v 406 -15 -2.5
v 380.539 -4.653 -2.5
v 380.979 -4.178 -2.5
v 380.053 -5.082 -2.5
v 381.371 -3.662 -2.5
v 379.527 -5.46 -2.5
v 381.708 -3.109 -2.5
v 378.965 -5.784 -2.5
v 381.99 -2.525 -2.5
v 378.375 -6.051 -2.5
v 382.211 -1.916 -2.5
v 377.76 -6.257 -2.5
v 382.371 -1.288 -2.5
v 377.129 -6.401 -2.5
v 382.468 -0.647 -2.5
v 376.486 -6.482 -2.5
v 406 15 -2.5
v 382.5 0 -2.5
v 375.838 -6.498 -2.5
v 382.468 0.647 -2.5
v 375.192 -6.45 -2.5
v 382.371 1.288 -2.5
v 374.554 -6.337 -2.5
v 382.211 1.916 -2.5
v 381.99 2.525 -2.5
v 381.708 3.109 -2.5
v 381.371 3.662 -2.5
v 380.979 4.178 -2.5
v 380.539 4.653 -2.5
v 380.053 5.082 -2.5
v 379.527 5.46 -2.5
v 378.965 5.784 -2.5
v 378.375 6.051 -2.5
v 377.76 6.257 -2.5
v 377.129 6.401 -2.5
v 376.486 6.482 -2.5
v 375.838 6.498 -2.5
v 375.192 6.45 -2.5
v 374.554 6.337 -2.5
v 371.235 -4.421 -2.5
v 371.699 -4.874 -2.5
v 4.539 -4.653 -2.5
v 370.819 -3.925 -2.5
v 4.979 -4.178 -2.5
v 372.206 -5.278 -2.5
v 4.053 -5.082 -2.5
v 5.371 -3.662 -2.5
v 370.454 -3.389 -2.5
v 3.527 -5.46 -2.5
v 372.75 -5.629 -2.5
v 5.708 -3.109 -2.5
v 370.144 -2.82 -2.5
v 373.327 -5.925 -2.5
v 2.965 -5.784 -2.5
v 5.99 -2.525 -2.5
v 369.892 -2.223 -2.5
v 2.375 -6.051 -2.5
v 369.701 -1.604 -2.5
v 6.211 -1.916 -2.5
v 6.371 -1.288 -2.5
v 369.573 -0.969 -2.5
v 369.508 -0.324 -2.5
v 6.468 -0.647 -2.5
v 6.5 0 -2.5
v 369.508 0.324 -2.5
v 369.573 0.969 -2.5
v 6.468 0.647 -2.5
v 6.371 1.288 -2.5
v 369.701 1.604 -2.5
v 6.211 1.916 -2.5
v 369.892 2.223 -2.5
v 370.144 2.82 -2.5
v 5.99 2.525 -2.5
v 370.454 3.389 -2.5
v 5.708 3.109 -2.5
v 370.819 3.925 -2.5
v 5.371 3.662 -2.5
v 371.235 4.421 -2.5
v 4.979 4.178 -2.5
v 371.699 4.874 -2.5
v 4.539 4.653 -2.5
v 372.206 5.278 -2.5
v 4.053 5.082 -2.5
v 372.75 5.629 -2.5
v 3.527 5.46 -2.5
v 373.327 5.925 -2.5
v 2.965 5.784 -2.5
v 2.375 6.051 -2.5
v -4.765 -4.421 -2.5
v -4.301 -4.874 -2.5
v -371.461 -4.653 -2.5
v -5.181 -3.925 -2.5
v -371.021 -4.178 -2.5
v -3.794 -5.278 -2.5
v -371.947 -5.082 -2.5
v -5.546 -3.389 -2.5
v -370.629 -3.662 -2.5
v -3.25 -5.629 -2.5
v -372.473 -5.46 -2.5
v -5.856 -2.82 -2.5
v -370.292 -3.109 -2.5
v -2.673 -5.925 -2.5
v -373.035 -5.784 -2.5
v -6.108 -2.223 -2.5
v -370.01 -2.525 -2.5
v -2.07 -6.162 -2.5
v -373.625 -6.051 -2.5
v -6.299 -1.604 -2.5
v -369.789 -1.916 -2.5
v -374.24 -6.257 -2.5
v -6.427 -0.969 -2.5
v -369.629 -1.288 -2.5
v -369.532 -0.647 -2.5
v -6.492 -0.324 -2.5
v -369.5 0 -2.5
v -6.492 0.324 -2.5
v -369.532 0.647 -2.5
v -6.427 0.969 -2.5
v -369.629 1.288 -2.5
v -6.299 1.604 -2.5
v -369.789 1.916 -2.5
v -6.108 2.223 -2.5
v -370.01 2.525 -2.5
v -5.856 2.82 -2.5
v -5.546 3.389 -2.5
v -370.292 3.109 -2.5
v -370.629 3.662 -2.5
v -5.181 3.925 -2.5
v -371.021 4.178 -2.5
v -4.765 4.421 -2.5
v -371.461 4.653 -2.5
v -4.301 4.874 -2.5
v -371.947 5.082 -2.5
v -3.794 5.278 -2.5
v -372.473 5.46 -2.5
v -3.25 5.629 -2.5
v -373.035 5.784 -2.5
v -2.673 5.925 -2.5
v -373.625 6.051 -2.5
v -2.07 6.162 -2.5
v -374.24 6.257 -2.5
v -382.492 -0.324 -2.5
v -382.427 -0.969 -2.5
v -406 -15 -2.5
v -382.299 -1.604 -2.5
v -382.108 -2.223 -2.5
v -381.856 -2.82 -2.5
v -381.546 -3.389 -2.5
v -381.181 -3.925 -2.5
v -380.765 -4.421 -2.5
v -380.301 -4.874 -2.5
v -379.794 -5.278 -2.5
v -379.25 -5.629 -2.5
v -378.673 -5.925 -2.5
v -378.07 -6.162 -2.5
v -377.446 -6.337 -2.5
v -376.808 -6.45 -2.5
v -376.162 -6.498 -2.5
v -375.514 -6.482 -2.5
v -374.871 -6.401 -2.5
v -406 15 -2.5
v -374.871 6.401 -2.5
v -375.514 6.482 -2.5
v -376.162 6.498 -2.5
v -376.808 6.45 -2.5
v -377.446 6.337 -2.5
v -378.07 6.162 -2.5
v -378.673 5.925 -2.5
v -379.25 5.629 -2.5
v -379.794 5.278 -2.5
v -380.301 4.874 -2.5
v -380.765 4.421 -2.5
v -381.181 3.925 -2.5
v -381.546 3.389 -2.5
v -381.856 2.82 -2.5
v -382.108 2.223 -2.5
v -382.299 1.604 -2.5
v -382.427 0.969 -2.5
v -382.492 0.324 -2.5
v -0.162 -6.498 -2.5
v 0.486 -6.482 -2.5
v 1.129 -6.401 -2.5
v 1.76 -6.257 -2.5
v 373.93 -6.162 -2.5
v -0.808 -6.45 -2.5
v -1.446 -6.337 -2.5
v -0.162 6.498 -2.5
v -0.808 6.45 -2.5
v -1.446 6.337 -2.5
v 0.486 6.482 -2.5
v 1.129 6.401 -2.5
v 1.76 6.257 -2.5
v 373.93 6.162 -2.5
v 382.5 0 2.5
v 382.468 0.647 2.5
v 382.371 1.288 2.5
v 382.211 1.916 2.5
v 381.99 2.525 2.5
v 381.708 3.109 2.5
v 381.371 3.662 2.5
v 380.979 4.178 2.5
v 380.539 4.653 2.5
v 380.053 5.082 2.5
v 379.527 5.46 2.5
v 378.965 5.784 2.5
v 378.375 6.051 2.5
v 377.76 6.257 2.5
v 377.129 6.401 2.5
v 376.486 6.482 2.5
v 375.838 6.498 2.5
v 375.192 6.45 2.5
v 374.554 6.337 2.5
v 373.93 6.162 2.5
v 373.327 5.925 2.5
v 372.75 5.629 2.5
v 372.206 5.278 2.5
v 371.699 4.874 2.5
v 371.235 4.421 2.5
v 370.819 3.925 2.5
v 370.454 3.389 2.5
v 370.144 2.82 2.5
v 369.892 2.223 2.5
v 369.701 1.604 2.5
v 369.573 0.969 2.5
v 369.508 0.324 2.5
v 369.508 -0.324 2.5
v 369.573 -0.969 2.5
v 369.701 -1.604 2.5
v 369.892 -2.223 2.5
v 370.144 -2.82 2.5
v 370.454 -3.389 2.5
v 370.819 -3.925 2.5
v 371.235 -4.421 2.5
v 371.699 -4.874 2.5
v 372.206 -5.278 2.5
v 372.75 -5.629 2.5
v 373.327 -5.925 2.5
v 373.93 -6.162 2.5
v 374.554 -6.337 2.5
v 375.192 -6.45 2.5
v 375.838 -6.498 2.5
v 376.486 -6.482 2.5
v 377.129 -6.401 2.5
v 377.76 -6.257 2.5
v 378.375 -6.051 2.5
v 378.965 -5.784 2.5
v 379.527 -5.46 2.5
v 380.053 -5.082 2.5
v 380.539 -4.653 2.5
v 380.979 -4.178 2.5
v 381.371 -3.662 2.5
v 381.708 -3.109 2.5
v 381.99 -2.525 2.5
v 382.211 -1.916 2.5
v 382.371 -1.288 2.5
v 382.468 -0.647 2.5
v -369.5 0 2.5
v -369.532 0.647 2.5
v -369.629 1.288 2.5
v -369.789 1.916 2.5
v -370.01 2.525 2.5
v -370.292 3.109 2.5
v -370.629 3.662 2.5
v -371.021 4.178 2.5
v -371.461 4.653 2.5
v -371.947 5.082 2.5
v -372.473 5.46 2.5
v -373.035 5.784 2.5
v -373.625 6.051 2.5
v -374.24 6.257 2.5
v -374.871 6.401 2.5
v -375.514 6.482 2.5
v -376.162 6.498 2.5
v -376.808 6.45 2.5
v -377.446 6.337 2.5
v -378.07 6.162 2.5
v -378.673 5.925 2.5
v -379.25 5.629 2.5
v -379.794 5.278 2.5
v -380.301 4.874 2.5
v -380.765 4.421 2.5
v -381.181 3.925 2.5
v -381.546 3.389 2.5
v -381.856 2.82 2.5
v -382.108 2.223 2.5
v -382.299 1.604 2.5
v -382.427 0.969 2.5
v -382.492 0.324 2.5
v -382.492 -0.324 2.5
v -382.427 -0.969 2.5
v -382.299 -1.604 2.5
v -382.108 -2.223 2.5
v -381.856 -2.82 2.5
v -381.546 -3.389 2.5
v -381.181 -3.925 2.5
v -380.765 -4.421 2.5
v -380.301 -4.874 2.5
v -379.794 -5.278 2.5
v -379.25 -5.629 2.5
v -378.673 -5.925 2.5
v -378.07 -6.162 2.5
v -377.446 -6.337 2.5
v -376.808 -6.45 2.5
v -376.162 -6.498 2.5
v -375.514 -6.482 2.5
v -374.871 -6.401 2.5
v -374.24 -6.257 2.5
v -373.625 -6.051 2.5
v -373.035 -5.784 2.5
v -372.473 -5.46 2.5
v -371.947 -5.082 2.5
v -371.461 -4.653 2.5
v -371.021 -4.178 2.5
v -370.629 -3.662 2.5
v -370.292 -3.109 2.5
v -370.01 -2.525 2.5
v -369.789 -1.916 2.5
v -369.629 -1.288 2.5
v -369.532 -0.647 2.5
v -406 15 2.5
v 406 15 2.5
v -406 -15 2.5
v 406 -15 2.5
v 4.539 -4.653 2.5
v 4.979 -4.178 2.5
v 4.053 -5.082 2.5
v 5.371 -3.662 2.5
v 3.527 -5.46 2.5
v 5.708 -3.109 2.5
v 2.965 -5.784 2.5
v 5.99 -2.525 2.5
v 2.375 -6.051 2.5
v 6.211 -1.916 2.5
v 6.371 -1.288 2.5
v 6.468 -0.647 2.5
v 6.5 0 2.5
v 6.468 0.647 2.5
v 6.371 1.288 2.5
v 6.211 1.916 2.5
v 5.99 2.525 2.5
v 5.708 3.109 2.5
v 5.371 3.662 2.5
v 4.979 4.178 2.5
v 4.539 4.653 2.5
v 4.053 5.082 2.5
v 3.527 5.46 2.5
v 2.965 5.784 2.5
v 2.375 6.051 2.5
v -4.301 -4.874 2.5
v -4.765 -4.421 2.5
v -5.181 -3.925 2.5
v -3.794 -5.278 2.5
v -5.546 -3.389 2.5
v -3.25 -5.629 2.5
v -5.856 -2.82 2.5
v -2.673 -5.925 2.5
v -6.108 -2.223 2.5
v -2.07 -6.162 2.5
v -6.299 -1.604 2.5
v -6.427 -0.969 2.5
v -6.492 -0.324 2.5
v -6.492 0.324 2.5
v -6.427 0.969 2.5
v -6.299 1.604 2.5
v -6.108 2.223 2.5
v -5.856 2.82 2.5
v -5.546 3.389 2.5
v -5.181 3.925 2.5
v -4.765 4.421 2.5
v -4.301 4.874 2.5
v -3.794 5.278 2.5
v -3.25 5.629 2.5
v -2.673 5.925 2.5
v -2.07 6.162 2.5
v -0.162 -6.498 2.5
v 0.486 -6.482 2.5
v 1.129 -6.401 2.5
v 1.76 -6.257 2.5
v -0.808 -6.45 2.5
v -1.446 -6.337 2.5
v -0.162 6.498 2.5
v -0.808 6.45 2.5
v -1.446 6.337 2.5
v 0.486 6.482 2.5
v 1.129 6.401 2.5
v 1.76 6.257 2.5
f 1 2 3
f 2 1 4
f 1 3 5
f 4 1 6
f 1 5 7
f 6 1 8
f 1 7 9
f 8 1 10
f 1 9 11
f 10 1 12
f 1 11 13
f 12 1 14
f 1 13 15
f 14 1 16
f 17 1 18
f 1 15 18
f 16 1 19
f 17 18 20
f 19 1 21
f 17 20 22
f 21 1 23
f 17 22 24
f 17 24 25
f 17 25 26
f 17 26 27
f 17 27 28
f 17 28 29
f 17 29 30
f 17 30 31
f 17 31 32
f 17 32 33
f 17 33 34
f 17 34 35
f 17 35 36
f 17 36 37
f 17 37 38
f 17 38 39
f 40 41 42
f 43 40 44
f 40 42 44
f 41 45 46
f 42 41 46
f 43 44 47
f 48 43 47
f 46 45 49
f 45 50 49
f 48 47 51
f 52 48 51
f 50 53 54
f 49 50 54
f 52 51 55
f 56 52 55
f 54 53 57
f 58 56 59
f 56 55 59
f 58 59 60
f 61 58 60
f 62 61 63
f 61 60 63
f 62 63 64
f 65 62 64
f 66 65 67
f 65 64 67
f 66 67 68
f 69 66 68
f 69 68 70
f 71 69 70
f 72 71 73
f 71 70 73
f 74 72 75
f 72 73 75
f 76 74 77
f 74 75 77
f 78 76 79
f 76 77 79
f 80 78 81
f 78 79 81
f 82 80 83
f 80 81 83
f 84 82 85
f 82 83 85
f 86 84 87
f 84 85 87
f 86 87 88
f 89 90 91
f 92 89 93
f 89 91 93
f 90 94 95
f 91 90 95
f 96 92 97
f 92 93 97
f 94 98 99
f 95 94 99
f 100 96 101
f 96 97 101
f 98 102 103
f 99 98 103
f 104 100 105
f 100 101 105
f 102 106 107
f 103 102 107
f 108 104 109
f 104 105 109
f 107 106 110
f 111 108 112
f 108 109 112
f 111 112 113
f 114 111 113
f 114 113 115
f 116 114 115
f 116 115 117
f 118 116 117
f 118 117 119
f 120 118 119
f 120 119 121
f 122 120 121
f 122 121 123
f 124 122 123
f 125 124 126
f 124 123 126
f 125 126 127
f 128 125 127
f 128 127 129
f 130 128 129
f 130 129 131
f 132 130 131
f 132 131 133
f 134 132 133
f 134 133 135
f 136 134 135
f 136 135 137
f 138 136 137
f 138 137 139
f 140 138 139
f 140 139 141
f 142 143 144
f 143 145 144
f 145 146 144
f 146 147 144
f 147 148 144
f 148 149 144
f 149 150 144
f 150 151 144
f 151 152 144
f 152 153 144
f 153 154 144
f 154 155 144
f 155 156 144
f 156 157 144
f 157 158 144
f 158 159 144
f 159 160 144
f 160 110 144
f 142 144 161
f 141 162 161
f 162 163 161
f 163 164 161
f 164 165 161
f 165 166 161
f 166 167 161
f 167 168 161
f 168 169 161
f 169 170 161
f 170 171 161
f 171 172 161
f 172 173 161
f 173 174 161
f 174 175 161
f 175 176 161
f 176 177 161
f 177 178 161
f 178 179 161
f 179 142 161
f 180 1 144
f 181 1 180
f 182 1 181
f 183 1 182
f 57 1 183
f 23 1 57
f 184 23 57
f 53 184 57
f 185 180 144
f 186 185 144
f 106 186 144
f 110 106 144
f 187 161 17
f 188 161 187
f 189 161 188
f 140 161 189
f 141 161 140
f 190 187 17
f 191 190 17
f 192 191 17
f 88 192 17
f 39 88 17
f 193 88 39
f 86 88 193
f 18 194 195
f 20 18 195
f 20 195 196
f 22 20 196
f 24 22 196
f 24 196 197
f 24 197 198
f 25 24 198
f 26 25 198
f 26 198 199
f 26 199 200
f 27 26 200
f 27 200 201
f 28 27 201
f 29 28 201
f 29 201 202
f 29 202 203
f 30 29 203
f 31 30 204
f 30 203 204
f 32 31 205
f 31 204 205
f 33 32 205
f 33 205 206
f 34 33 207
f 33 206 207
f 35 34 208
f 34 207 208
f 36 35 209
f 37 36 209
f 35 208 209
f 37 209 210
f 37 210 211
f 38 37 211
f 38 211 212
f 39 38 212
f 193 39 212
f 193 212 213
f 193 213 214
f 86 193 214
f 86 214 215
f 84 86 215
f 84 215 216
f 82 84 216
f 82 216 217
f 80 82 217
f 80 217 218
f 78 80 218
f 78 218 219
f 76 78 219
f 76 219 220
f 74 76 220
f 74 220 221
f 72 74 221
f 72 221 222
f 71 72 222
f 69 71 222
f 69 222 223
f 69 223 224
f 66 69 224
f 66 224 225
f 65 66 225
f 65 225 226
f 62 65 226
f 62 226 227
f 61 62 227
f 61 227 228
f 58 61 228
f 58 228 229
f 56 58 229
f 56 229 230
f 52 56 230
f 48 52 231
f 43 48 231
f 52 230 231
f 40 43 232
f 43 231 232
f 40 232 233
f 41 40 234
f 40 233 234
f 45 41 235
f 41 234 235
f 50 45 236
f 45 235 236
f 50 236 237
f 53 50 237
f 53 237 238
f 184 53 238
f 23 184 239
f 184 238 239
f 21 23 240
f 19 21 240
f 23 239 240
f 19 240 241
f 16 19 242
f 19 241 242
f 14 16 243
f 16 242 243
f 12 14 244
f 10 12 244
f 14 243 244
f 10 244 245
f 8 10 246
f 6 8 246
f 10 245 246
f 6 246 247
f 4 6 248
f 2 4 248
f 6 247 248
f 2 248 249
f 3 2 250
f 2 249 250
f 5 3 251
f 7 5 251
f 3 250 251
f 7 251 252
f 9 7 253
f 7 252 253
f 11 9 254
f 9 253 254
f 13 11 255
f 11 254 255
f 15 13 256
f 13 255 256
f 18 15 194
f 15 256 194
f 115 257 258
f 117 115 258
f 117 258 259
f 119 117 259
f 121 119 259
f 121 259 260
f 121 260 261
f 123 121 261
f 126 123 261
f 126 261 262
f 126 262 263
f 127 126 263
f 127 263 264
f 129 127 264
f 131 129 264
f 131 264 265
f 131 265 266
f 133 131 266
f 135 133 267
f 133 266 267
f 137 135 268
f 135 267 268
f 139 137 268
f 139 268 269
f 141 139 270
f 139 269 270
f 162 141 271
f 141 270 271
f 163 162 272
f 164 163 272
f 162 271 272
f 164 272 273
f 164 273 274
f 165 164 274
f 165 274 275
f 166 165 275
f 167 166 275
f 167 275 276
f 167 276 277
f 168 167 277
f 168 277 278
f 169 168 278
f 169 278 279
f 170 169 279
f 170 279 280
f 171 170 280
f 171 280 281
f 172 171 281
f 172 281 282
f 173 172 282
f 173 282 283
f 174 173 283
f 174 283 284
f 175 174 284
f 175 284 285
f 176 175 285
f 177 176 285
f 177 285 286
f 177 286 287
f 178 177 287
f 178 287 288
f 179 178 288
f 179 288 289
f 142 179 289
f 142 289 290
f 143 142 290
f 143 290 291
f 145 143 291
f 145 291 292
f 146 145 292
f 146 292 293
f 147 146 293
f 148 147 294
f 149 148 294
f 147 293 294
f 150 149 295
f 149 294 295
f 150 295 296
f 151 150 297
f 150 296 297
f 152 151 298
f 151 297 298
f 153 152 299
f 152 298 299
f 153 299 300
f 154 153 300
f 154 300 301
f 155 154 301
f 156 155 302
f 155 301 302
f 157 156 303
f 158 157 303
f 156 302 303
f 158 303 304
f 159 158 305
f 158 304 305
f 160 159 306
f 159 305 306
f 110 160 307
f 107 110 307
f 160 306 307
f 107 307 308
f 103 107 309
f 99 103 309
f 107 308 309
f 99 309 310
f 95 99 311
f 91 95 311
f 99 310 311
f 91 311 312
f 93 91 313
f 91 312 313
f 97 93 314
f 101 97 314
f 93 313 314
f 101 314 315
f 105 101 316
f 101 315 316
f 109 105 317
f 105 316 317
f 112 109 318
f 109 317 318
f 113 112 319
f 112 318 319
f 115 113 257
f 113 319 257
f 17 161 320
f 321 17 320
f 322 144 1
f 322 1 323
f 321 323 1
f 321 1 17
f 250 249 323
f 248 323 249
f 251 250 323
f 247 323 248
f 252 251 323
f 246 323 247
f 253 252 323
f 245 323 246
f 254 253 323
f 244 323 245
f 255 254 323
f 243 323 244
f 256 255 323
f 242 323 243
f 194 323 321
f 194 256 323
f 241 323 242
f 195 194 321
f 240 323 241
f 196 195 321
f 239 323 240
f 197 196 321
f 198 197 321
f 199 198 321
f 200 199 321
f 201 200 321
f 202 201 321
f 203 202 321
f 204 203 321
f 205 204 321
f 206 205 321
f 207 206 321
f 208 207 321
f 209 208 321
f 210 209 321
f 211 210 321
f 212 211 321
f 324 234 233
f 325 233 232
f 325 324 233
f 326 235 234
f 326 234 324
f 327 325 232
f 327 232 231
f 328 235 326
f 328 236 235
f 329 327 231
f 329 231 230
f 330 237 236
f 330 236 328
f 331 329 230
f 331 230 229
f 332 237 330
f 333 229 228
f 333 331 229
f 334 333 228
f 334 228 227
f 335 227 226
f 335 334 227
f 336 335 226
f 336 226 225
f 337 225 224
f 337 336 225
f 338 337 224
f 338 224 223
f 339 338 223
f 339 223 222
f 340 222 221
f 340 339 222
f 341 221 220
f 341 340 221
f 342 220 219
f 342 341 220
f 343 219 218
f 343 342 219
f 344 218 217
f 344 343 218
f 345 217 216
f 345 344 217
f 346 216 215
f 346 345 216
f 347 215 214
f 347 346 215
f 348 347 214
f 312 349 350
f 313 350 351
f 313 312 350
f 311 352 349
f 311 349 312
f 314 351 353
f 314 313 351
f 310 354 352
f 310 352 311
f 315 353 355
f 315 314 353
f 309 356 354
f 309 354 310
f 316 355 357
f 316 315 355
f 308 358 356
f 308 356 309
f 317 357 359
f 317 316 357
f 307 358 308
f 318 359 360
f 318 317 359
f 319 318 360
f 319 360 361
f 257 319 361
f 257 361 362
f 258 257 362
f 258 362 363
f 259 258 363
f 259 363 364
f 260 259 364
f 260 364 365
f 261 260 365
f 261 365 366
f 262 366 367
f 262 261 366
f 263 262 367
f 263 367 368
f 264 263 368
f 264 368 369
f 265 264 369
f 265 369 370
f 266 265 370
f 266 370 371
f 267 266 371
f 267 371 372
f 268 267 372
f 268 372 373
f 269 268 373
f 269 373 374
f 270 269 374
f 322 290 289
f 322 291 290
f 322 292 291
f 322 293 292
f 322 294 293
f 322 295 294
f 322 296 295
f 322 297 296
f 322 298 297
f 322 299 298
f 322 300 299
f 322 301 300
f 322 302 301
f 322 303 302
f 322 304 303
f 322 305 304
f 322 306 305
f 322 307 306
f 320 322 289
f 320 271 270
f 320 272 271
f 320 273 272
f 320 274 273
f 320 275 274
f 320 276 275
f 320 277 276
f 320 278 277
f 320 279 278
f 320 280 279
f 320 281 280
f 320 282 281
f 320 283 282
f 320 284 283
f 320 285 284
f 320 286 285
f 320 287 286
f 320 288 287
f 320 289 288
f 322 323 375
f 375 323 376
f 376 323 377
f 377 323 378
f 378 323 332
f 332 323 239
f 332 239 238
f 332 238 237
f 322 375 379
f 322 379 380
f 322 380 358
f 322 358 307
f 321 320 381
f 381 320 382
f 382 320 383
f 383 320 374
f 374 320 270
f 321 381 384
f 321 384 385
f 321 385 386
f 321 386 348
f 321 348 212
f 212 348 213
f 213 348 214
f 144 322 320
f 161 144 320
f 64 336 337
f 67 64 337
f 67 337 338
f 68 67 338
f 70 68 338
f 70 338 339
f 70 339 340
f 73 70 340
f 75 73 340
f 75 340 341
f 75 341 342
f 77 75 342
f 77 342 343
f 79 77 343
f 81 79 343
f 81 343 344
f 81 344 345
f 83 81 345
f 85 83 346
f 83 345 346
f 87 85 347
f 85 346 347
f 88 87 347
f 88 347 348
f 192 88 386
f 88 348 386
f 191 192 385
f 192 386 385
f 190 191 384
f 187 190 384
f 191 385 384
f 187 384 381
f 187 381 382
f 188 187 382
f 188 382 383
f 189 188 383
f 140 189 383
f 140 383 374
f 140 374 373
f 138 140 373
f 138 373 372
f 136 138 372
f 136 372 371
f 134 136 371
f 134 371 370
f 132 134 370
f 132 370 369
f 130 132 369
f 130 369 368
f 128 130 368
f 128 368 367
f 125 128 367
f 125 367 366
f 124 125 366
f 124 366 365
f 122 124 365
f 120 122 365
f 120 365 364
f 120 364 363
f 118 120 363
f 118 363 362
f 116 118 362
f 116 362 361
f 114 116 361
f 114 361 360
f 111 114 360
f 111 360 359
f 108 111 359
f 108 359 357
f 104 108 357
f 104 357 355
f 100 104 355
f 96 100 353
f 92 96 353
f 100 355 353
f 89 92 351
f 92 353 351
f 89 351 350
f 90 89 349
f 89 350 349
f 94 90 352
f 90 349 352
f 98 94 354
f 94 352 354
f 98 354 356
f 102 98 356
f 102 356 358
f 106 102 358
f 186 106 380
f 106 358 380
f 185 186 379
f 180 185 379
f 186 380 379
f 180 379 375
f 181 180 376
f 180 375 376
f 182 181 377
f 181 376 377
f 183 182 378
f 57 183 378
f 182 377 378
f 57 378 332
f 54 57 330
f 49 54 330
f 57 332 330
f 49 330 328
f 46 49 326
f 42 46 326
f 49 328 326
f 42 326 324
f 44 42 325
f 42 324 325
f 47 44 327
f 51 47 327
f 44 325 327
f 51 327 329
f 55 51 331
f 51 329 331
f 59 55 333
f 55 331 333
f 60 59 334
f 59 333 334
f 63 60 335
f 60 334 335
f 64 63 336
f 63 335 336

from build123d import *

# Parameters (mm, degrees)
PLAT_W                          = 30
PLAT_H                          = 5
EL_MENT_M_CANO_SOUD_1_DEPTH     = 812
DIAM_TRE_DU_PER_AGE_13_0_13_1_D = 13
R_P_TITION_LIN_AIRE2_COUNT      = 3
R_P_TITION_LIN_AIRE2_PITCH      = 376


with BuildPart() as part:
    # plat → Elément mécano-soudé1 (new body)
    with BuildSketch(Plane.YZ.offset(-406)):
        Rectangle(PLAT_W, PLAT_H)
    extrude(amount=EL_MENT_M_CANO_SOUD_1_DEPTH)

    # Diamètre du perçage Ø13.0 (13)1 (through all)
    with Locations(Plane(origin=(0, 0, -2.5), x_dir=(-1, 0, 0), z_dir=(0, 0, -1))):
        with Locations((376, 0)):
            diam_tre_du_per_age_13_0_13_1 = Hole(DIAM_TRE_DU_PER_AGE_13_0_13_1_D / 2)

    # Répétition linéaire2: Diamètre du perçage Ø13.0 (13)1 ×3
    with Locations(*[(i * R_P_TITION_LIN_AIRE2_PITCH, 0, 0) for i in range(1, R_P_TITION_LIN_AIRE2_COUNT)]):
        add(diam_tre_du_per_age_13_0_13_1, mode=Mode.SUBTRACT)


solid = part.part
